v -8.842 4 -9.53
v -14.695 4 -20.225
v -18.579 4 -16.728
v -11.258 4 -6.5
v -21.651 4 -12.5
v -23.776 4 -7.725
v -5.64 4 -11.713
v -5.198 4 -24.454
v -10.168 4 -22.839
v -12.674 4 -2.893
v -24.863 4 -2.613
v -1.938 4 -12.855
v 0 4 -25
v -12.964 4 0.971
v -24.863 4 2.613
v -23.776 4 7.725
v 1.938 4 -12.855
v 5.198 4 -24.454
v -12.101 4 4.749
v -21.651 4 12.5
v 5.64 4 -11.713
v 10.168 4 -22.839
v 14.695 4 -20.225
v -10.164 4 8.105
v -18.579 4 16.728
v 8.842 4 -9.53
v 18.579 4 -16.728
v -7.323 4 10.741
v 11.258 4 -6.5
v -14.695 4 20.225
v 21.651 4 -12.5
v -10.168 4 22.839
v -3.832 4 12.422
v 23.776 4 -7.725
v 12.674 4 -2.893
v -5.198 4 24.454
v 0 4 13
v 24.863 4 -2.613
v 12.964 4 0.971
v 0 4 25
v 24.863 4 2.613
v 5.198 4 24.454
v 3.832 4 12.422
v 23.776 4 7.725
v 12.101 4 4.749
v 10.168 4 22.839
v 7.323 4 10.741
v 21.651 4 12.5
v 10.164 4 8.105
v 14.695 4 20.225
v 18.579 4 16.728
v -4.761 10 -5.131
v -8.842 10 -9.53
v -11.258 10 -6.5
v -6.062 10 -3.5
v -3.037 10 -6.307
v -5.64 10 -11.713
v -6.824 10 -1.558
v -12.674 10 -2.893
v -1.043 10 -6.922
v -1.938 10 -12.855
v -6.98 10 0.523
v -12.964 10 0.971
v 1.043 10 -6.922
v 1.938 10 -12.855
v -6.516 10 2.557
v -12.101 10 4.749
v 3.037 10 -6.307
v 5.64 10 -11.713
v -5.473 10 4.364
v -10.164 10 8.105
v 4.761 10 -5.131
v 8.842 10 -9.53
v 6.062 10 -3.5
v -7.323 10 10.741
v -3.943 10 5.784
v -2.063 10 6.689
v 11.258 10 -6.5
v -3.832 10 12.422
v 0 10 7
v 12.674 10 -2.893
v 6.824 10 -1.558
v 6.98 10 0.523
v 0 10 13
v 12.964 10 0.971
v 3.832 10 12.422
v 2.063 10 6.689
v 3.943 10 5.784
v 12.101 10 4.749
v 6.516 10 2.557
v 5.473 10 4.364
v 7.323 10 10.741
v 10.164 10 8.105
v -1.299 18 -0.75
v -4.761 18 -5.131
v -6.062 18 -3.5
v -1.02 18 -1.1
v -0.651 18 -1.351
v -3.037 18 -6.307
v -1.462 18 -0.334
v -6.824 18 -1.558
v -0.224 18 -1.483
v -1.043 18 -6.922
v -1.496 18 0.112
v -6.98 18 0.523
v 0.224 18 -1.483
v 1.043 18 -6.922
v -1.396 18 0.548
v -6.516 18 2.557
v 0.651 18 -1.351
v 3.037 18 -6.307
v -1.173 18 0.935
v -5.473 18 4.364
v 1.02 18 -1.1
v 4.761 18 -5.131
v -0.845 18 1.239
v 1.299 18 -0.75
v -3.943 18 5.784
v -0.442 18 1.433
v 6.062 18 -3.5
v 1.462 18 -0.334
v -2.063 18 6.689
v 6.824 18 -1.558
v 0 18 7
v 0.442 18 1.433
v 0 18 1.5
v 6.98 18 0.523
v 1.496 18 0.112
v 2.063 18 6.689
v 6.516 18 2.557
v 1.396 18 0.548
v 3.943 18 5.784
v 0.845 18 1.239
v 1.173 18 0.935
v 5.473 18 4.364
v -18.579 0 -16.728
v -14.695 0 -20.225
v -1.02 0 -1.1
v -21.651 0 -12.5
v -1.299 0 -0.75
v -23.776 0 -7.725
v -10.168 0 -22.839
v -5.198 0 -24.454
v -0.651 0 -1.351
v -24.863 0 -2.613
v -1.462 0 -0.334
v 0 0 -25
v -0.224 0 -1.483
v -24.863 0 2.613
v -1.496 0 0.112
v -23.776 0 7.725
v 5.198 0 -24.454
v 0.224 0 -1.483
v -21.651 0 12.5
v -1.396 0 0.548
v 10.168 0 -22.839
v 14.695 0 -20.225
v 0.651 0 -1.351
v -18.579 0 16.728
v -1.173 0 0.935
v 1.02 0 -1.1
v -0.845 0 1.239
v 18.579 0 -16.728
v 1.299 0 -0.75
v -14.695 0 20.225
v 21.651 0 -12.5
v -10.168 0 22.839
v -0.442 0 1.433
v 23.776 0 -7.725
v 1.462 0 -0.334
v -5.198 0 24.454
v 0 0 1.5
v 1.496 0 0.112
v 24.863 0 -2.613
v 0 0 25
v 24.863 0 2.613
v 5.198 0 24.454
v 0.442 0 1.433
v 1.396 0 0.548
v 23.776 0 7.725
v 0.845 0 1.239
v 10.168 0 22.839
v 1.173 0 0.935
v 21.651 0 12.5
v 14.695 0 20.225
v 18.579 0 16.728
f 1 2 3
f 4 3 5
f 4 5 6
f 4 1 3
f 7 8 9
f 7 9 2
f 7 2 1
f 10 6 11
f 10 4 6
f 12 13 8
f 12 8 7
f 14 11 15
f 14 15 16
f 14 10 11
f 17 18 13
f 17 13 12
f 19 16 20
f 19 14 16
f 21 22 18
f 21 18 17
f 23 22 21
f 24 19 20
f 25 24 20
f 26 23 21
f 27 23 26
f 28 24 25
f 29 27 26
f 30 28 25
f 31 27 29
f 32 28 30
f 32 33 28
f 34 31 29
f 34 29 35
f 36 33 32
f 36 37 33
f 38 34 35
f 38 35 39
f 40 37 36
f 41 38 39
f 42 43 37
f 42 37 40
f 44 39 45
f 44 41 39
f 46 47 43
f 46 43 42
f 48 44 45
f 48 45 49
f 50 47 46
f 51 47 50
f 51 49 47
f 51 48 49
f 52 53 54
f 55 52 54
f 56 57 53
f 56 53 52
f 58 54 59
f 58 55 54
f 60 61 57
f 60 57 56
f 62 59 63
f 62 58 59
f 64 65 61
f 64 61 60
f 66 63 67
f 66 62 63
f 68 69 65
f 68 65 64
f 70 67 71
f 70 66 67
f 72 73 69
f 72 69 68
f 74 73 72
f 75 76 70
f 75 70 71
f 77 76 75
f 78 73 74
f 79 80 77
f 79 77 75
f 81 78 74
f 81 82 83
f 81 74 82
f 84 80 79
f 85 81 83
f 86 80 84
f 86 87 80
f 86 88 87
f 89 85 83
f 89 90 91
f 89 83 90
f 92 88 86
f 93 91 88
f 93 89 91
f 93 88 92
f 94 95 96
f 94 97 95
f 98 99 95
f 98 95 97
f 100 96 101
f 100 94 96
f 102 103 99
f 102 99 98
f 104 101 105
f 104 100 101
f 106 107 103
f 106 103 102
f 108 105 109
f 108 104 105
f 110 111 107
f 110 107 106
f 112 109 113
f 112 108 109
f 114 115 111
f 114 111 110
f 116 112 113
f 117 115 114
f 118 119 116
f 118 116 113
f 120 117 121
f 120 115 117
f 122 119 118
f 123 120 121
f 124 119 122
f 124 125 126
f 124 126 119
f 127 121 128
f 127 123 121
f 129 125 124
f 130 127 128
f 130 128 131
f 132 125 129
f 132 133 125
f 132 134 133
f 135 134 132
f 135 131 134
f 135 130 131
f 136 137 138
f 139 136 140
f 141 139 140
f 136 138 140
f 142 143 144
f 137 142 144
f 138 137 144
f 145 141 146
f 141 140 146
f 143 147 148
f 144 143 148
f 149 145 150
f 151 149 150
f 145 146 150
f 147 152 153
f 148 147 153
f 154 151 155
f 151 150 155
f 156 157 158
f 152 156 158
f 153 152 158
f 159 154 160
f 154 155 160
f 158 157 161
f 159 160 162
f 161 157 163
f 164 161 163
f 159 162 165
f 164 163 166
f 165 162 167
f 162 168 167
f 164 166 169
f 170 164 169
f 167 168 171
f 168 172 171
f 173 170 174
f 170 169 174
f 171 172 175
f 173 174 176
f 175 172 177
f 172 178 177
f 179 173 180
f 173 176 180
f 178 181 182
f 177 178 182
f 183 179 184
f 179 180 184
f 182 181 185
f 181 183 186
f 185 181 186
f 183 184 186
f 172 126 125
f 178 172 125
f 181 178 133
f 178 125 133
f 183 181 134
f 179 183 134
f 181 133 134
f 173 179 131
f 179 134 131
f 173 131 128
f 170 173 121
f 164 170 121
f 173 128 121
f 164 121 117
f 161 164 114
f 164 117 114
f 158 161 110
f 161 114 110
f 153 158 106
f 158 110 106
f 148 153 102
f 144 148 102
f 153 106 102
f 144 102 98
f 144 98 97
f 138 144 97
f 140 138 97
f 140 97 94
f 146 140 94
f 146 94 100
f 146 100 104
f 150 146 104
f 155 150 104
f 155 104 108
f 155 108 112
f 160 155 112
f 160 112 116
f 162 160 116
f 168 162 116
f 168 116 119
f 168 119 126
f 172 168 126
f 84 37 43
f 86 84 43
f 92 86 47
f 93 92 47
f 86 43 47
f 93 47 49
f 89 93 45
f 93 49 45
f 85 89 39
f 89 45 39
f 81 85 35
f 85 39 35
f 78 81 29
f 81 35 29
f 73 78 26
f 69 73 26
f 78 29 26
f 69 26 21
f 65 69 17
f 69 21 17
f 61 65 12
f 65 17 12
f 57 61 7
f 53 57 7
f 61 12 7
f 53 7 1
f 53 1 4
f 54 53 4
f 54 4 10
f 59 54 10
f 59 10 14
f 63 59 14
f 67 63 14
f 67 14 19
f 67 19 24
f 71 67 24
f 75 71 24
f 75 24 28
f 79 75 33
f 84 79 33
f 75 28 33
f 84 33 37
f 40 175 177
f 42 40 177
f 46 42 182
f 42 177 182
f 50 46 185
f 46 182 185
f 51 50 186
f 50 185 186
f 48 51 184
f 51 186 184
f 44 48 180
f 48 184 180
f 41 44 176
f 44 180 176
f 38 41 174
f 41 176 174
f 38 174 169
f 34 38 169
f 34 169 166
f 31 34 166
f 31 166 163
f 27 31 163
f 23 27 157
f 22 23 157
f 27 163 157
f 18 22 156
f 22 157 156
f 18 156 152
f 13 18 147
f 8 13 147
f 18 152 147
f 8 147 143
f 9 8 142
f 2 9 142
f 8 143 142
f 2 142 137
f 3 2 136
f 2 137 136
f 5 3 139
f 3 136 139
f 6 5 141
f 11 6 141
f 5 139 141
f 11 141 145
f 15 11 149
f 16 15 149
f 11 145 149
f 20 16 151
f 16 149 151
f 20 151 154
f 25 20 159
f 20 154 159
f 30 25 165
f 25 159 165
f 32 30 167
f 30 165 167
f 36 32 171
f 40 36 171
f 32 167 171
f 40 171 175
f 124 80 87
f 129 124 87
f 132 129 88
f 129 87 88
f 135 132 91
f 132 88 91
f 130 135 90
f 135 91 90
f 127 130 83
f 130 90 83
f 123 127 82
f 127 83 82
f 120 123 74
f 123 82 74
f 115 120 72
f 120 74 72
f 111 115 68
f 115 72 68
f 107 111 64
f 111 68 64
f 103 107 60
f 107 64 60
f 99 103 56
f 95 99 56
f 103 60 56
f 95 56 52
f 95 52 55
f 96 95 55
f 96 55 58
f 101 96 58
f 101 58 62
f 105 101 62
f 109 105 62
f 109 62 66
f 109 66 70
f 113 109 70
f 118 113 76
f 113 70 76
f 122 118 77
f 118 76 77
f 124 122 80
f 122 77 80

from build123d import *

# Parameters (mm, degrees)
SKETCH1_R           = 25
BOSS_EXTRUDE1_DEPTH = 4
SKETCH2_R           = 13
BOSS_EXTRUDE2_DEPTH = 6
SKETCH3_R           = 7
BOSS_EXTRUDE3_DEPTH = 8
SKETCH4_R           = 1.5
CUT_EXTRUDE1_DEPTH  = 40.67366885


with BuildPart() as part:
    # Sketch1 → Boss-Extrude1 (new body)
    with BuildSketch(Plane(origin=(0, 0, 0), x_dir=(1, 0, 0), z_dir=(0, 1, 0))):
        with Locations(Location((0, 0, 0), (0, 0, 270))):
            Circle(SKETCH1_R)
    extrude(amount=BOSS_EXTRUDE1_DEPTH)

    # Sketch2 → Boss-Extrude2 (add)
    with BuildSketch(Plane(origin=(0, 4, 0), x_dir=(1, 0, 0), z_dir=(0, 1, 0))):
        with Locations(Location((0, 0, 0), (0, 0, 270))):
            Circle(SKETCH2_R)
    extrude(amount=BOSS_EXTRUDE2_DEPTH)

    # Sketch3 → Boss-Extrude3 (add)
    with BuildSketch(Plane(origin=(0, 10, 0), x_dir=(1, 0, 0), z_dir=(0, 1, 0))):
        with Locations(Location((0, 0, 0), (0, 0, 270))):
            Circle(SKETCH3_R)
    extrude(amount=BOSS_EXTRUDE3_DEPTH)

    # Sketch4 → Cut-Extrude1 (cut, through all)
    with BuildSketch(Plane(origin=(0, 18, 0), x_dir=(1, 0, 0), z_dir=(0, 1, 0))):
        with Locations(Location((0, 0, 0), (0, 0, 270))):
            Circle(SKETCH4_R)
    extrude(amount=-CUT_EXTRUDE1_DEPTH, mode=Mode.SUBTRACT)


solid = part.part
